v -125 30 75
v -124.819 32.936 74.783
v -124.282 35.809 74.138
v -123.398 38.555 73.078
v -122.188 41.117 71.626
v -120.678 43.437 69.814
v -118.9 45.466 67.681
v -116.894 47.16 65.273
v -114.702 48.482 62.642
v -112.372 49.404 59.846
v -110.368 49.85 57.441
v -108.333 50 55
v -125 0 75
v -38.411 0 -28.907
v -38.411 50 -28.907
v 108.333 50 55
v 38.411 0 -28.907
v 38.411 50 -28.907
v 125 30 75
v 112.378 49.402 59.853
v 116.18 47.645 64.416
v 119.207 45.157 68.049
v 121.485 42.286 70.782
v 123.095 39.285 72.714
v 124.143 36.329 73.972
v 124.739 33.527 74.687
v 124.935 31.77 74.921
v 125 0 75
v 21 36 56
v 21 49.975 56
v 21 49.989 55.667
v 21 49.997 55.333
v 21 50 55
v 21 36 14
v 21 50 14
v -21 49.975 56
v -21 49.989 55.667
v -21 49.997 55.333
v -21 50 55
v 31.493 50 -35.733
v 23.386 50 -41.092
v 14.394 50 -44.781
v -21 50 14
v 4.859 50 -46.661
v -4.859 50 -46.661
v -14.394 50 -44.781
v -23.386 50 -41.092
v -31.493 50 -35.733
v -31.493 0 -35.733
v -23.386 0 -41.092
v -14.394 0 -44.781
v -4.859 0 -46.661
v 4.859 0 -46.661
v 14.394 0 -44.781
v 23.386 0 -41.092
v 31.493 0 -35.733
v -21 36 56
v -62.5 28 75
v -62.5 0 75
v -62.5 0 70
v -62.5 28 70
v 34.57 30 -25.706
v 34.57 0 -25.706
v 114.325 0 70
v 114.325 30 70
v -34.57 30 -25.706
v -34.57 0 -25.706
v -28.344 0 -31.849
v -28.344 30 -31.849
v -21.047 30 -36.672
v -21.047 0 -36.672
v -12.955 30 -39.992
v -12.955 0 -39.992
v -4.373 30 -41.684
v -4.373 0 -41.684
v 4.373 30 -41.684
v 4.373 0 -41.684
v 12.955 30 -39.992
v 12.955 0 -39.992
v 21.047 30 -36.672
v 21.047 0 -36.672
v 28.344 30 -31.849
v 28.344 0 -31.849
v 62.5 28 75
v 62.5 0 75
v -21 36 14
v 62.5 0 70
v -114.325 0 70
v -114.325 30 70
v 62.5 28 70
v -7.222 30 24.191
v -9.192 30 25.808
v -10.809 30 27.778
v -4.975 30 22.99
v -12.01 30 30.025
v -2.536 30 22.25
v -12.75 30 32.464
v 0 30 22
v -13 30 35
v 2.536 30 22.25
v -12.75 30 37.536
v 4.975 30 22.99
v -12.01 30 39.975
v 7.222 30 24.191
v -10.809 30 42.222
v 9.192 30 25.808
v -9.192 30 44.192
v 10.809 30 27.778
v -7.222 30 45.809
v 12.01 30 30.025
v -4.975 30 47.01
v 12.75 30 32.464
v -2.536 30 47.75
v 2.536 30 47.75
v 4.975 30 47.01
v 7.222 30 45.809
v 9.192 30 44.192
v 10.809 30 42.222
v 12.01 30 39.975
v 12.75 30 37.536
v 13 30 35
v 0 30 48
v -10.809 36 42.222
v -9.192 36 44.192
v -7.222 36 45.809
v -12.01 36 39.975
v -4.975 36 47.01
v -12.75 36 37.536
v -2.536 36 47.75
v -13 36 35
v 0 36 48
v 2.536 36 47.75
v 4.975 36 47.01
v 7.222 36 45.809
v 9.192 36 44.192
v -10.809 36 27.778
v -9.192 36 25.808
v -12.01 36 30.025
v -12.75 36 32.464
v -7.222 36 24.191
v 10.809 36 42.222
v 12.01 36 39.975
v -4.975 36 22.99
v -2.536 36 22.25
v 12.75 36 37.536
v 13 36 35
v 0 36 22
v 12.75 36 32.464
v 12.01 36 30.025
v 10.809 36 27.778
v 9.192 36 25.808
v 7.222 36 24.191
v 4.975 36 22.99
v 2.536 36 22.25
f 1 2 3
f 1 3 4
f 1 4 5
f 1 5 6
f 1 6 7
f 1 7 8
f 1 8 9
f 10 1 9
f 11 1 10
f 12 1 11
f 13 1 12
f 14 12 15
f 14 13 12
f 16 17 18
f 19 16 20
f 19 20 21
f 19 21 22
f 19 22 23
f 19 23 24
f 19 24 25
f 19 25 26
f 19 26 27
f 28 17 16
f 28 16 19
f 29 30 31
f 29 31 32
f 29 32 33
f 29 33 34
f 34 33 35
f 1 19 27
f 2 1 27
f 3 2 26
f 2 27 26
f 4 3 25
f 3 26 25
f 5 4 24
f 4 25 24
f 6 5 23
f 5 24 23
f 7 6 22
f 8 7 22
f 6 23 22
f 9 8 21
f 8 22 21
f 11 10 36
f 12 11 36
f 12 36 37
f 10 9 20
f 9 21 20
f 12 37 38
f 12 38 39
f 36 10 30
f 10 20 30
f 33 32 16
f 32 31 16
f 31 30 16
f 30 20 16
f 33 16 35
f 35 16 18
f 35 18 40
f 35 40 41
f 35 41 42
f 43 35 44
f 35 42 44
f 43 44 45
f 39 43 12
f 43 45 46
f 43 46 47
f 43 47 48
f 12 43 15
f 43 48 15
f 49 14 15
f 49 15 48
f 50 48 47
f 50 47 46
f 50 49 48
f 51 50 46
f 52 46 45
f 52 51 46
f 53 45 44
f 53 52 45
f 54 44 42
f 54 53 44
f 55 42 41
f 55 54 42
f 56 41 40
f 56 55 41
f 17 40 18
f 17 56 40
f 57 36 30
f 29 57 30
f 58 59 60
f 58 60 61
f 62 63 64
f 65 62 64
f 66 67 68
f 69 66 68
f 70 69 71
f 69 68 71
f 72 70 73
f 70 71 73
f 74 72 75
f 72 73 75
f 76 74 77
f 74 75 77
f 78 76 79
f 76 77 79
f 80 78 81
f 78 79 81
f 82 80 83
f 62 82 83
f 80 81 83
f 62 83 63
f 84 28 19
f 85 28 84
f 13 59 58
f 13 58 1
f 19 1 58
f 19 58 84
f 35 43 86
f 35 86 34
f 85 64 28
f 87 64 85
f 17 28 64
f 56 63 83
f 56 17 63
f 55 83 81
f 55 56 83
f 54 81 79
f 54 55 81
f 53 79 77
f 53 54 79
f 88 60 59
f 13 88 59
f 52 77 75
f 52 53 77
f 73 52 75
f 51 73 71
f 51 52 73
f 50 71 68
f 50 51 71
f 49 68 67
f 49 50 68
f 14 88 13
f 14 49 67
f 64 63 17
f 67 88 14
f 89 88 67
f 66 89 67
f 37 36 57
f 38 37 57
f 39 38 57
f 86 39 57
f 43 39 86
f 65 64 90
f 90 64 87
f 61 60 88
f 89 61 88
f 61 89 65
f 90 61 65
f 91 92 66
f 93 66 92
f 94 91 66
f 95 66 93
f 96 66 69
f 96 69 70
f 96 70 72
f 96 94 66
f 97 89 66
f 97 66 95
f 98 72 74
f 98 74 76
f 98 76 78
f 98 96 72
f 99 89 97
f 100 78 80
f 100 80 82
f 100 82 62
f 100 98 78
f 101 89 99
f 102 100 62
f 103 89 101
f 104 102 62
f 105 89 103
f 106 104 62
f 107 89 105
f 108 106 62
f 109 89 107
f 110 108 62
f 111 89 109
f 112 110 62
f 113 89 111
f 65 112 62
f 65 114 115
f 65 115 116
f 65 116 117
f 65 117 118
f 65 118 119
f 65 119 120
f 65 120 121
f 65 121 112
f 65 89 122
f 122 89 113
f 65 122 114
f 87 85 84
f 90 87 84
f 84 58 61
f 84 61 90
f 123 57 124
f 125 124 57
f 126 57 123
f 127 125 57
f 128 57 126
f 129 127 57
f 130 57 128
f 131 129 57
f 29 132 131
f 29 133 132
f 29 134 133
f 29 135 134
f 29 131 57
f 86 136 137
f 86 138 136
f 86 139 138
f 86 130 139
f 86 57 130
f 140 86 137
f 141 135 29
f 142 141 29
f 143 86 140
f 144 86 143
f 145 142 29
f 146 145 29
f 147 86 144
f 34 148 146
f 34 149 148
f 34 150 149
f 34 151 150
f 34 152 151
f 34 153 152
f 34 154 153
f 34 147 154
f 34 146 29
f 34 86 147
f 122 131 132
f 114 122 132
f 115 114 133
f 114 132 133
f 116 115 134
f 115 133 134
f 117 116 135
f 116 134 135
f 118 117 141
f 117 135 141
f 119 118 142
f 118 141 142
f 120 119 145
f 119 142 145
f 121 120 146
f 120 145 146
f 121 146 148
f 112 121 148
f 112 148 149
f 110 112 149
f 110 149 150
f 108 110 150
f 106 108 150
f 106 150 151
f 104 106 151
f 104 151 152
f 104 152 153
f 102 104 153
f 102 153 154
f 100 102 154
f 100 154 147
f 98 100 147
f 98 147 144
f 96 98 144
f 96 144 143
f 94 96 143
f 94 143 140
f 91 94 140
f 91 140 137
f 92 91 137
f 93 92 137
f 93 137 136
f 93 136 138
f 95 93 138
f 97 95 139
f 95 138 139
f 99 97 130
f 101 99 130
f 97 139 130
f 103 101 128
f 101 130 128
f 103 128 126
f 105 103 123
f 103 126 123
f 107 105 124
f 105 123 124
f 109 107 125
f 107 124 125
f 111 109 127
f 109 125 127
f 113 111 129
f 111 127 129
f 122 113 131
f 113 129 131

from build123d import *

# Parameters (mm, degrees)
AUFSATZ_LINEAR_AUSTRAGEN1_DEPTH = 50
SKIZZE2_W                       = 125
SKIZZE2_H                       = 28
SCHNITT_LINEAR_AUSTRAGEN1_DEPTH = 30
SCHNITT_LINEAR_AUSTRAGEN2_DEPTH = 30
SKIZZE4_R                       = 13
SCHNITT_LINEAR_AUSTRAGEN3_DEPTH = 30
SKIZZE5_W                       = 42
SKIZZE5_H                       = 42
SCHNITT_LINEAR_AUSTRAGEN4_DEPTH = 14
VERRUNDUNG1_R                   = 20


with BuildPart() as part:
    # Skizze1 → Aufsatz-Linear austragen1 (new body)
    with BuildSketch(Plane(origin=(0, 0, 0), x_dir=(1, 0, 0), z_dir=(0, 1, 0))):
        with BuildLine():
            ThreePointArc((-38.41106398, 28.906723224), (0, 46.897503241), (38.41106398, 28.906723224))
            Line((38.41106398, 28.906723224), (125, -75))
            Line((125, -75), (-125, -75))
            Line((-125, -75), (-38.41106398, 28.906723224))
        make_face()
    extrude(amount=AUFSATZ_LINEAR_AUSTRAGEN1_DEPTH)

    # Skizze2 → Schnitt-Linear austragen1 (cut)
    with BuildSketch(Plane.XY.offset(75)):
        with Locations((0, 14)):
            Rectangle(SKIZZE2_W, SKIZZE2_H)
    extrude(amount=-SCHNITT_LINEAR_AUSTRAGEN1_DEPTH, mode=Mode.SUBTRACT)

    # Skizze3 → Schnitt-Linear austragen2 (cut)
    with BuildSketch(Plane.XZ):
        with BuildLine():
            Line((114.324791937, 70), (-114.324791937, 70))
            Line((-114.324791937, 70), (-34.569957582, -25.705801226))
            ThreePointArc((-34.569957582, -25.705801226), (0, -41.897503241), (34.569957582, -25.705801226))
            Line((34.569957582, -25.705801226), (114.324791937, 70))
        make_face()
    extrude(amount=-SCHNITT_LINEAR_AUSTRAGEN2_DEPTH, mode=Mode.SUBTRACT)

    # Skizze4 → Schnitt-Linear austragen3 (cut)
    with BuildSketch(Plane(origin=(0, 50, 0), x_dir=(1, 0, 0), z_dir=(0, 1, 0))):
        with Locations(Location((0, -35, 0), (0, 0, 270))):
            Circle(SKIZZE4_R)
    extrude(amount=-SCHNITT_LINEAR_AUSTRAGEN3_DEPTH, mode=Mode.SUBTRACT)

    # Skizze5 → Schnitt-Linear austragen4 (cut)
    with BuildSketch(Plane(origin=(0, 50, 0), x_dir=(1, 0, 0), z_dir=(0, 1, 0))):
        with Locations((0, -35)):
            Rectangle(SKIZZE5_W, SKIZZE5_H)
    extrude(amount=-SCHNITT_LINEAR_AUSTRAGEN4_DEPTH, mode=Mode.SUBTRACT)

    # Verrundung1
    # the kernel refuses this fillet: 20 mm, written as the material it takes off along each edge
    with BuildSketch(Plane(origin=(175, 50, 75), x_dir=(0, -1, 0), z_dir=(-1, 0, 0))) as verrundung1_piece_1:
        with BuildLine():
            CenterArc((VERRUNDUNG1_R, -VERRUNDUNG1_R), VERRUNDUNG1_R, 90, 90)
            Line((0, -VERRUNDUNG1_R), (0, 0))
            Line((0, 0), (VERRUNDUNG1_R, 0))
        make_face()
    extrude(amount=350, mode=Mode.SUBTRACT)


solid = part.part
